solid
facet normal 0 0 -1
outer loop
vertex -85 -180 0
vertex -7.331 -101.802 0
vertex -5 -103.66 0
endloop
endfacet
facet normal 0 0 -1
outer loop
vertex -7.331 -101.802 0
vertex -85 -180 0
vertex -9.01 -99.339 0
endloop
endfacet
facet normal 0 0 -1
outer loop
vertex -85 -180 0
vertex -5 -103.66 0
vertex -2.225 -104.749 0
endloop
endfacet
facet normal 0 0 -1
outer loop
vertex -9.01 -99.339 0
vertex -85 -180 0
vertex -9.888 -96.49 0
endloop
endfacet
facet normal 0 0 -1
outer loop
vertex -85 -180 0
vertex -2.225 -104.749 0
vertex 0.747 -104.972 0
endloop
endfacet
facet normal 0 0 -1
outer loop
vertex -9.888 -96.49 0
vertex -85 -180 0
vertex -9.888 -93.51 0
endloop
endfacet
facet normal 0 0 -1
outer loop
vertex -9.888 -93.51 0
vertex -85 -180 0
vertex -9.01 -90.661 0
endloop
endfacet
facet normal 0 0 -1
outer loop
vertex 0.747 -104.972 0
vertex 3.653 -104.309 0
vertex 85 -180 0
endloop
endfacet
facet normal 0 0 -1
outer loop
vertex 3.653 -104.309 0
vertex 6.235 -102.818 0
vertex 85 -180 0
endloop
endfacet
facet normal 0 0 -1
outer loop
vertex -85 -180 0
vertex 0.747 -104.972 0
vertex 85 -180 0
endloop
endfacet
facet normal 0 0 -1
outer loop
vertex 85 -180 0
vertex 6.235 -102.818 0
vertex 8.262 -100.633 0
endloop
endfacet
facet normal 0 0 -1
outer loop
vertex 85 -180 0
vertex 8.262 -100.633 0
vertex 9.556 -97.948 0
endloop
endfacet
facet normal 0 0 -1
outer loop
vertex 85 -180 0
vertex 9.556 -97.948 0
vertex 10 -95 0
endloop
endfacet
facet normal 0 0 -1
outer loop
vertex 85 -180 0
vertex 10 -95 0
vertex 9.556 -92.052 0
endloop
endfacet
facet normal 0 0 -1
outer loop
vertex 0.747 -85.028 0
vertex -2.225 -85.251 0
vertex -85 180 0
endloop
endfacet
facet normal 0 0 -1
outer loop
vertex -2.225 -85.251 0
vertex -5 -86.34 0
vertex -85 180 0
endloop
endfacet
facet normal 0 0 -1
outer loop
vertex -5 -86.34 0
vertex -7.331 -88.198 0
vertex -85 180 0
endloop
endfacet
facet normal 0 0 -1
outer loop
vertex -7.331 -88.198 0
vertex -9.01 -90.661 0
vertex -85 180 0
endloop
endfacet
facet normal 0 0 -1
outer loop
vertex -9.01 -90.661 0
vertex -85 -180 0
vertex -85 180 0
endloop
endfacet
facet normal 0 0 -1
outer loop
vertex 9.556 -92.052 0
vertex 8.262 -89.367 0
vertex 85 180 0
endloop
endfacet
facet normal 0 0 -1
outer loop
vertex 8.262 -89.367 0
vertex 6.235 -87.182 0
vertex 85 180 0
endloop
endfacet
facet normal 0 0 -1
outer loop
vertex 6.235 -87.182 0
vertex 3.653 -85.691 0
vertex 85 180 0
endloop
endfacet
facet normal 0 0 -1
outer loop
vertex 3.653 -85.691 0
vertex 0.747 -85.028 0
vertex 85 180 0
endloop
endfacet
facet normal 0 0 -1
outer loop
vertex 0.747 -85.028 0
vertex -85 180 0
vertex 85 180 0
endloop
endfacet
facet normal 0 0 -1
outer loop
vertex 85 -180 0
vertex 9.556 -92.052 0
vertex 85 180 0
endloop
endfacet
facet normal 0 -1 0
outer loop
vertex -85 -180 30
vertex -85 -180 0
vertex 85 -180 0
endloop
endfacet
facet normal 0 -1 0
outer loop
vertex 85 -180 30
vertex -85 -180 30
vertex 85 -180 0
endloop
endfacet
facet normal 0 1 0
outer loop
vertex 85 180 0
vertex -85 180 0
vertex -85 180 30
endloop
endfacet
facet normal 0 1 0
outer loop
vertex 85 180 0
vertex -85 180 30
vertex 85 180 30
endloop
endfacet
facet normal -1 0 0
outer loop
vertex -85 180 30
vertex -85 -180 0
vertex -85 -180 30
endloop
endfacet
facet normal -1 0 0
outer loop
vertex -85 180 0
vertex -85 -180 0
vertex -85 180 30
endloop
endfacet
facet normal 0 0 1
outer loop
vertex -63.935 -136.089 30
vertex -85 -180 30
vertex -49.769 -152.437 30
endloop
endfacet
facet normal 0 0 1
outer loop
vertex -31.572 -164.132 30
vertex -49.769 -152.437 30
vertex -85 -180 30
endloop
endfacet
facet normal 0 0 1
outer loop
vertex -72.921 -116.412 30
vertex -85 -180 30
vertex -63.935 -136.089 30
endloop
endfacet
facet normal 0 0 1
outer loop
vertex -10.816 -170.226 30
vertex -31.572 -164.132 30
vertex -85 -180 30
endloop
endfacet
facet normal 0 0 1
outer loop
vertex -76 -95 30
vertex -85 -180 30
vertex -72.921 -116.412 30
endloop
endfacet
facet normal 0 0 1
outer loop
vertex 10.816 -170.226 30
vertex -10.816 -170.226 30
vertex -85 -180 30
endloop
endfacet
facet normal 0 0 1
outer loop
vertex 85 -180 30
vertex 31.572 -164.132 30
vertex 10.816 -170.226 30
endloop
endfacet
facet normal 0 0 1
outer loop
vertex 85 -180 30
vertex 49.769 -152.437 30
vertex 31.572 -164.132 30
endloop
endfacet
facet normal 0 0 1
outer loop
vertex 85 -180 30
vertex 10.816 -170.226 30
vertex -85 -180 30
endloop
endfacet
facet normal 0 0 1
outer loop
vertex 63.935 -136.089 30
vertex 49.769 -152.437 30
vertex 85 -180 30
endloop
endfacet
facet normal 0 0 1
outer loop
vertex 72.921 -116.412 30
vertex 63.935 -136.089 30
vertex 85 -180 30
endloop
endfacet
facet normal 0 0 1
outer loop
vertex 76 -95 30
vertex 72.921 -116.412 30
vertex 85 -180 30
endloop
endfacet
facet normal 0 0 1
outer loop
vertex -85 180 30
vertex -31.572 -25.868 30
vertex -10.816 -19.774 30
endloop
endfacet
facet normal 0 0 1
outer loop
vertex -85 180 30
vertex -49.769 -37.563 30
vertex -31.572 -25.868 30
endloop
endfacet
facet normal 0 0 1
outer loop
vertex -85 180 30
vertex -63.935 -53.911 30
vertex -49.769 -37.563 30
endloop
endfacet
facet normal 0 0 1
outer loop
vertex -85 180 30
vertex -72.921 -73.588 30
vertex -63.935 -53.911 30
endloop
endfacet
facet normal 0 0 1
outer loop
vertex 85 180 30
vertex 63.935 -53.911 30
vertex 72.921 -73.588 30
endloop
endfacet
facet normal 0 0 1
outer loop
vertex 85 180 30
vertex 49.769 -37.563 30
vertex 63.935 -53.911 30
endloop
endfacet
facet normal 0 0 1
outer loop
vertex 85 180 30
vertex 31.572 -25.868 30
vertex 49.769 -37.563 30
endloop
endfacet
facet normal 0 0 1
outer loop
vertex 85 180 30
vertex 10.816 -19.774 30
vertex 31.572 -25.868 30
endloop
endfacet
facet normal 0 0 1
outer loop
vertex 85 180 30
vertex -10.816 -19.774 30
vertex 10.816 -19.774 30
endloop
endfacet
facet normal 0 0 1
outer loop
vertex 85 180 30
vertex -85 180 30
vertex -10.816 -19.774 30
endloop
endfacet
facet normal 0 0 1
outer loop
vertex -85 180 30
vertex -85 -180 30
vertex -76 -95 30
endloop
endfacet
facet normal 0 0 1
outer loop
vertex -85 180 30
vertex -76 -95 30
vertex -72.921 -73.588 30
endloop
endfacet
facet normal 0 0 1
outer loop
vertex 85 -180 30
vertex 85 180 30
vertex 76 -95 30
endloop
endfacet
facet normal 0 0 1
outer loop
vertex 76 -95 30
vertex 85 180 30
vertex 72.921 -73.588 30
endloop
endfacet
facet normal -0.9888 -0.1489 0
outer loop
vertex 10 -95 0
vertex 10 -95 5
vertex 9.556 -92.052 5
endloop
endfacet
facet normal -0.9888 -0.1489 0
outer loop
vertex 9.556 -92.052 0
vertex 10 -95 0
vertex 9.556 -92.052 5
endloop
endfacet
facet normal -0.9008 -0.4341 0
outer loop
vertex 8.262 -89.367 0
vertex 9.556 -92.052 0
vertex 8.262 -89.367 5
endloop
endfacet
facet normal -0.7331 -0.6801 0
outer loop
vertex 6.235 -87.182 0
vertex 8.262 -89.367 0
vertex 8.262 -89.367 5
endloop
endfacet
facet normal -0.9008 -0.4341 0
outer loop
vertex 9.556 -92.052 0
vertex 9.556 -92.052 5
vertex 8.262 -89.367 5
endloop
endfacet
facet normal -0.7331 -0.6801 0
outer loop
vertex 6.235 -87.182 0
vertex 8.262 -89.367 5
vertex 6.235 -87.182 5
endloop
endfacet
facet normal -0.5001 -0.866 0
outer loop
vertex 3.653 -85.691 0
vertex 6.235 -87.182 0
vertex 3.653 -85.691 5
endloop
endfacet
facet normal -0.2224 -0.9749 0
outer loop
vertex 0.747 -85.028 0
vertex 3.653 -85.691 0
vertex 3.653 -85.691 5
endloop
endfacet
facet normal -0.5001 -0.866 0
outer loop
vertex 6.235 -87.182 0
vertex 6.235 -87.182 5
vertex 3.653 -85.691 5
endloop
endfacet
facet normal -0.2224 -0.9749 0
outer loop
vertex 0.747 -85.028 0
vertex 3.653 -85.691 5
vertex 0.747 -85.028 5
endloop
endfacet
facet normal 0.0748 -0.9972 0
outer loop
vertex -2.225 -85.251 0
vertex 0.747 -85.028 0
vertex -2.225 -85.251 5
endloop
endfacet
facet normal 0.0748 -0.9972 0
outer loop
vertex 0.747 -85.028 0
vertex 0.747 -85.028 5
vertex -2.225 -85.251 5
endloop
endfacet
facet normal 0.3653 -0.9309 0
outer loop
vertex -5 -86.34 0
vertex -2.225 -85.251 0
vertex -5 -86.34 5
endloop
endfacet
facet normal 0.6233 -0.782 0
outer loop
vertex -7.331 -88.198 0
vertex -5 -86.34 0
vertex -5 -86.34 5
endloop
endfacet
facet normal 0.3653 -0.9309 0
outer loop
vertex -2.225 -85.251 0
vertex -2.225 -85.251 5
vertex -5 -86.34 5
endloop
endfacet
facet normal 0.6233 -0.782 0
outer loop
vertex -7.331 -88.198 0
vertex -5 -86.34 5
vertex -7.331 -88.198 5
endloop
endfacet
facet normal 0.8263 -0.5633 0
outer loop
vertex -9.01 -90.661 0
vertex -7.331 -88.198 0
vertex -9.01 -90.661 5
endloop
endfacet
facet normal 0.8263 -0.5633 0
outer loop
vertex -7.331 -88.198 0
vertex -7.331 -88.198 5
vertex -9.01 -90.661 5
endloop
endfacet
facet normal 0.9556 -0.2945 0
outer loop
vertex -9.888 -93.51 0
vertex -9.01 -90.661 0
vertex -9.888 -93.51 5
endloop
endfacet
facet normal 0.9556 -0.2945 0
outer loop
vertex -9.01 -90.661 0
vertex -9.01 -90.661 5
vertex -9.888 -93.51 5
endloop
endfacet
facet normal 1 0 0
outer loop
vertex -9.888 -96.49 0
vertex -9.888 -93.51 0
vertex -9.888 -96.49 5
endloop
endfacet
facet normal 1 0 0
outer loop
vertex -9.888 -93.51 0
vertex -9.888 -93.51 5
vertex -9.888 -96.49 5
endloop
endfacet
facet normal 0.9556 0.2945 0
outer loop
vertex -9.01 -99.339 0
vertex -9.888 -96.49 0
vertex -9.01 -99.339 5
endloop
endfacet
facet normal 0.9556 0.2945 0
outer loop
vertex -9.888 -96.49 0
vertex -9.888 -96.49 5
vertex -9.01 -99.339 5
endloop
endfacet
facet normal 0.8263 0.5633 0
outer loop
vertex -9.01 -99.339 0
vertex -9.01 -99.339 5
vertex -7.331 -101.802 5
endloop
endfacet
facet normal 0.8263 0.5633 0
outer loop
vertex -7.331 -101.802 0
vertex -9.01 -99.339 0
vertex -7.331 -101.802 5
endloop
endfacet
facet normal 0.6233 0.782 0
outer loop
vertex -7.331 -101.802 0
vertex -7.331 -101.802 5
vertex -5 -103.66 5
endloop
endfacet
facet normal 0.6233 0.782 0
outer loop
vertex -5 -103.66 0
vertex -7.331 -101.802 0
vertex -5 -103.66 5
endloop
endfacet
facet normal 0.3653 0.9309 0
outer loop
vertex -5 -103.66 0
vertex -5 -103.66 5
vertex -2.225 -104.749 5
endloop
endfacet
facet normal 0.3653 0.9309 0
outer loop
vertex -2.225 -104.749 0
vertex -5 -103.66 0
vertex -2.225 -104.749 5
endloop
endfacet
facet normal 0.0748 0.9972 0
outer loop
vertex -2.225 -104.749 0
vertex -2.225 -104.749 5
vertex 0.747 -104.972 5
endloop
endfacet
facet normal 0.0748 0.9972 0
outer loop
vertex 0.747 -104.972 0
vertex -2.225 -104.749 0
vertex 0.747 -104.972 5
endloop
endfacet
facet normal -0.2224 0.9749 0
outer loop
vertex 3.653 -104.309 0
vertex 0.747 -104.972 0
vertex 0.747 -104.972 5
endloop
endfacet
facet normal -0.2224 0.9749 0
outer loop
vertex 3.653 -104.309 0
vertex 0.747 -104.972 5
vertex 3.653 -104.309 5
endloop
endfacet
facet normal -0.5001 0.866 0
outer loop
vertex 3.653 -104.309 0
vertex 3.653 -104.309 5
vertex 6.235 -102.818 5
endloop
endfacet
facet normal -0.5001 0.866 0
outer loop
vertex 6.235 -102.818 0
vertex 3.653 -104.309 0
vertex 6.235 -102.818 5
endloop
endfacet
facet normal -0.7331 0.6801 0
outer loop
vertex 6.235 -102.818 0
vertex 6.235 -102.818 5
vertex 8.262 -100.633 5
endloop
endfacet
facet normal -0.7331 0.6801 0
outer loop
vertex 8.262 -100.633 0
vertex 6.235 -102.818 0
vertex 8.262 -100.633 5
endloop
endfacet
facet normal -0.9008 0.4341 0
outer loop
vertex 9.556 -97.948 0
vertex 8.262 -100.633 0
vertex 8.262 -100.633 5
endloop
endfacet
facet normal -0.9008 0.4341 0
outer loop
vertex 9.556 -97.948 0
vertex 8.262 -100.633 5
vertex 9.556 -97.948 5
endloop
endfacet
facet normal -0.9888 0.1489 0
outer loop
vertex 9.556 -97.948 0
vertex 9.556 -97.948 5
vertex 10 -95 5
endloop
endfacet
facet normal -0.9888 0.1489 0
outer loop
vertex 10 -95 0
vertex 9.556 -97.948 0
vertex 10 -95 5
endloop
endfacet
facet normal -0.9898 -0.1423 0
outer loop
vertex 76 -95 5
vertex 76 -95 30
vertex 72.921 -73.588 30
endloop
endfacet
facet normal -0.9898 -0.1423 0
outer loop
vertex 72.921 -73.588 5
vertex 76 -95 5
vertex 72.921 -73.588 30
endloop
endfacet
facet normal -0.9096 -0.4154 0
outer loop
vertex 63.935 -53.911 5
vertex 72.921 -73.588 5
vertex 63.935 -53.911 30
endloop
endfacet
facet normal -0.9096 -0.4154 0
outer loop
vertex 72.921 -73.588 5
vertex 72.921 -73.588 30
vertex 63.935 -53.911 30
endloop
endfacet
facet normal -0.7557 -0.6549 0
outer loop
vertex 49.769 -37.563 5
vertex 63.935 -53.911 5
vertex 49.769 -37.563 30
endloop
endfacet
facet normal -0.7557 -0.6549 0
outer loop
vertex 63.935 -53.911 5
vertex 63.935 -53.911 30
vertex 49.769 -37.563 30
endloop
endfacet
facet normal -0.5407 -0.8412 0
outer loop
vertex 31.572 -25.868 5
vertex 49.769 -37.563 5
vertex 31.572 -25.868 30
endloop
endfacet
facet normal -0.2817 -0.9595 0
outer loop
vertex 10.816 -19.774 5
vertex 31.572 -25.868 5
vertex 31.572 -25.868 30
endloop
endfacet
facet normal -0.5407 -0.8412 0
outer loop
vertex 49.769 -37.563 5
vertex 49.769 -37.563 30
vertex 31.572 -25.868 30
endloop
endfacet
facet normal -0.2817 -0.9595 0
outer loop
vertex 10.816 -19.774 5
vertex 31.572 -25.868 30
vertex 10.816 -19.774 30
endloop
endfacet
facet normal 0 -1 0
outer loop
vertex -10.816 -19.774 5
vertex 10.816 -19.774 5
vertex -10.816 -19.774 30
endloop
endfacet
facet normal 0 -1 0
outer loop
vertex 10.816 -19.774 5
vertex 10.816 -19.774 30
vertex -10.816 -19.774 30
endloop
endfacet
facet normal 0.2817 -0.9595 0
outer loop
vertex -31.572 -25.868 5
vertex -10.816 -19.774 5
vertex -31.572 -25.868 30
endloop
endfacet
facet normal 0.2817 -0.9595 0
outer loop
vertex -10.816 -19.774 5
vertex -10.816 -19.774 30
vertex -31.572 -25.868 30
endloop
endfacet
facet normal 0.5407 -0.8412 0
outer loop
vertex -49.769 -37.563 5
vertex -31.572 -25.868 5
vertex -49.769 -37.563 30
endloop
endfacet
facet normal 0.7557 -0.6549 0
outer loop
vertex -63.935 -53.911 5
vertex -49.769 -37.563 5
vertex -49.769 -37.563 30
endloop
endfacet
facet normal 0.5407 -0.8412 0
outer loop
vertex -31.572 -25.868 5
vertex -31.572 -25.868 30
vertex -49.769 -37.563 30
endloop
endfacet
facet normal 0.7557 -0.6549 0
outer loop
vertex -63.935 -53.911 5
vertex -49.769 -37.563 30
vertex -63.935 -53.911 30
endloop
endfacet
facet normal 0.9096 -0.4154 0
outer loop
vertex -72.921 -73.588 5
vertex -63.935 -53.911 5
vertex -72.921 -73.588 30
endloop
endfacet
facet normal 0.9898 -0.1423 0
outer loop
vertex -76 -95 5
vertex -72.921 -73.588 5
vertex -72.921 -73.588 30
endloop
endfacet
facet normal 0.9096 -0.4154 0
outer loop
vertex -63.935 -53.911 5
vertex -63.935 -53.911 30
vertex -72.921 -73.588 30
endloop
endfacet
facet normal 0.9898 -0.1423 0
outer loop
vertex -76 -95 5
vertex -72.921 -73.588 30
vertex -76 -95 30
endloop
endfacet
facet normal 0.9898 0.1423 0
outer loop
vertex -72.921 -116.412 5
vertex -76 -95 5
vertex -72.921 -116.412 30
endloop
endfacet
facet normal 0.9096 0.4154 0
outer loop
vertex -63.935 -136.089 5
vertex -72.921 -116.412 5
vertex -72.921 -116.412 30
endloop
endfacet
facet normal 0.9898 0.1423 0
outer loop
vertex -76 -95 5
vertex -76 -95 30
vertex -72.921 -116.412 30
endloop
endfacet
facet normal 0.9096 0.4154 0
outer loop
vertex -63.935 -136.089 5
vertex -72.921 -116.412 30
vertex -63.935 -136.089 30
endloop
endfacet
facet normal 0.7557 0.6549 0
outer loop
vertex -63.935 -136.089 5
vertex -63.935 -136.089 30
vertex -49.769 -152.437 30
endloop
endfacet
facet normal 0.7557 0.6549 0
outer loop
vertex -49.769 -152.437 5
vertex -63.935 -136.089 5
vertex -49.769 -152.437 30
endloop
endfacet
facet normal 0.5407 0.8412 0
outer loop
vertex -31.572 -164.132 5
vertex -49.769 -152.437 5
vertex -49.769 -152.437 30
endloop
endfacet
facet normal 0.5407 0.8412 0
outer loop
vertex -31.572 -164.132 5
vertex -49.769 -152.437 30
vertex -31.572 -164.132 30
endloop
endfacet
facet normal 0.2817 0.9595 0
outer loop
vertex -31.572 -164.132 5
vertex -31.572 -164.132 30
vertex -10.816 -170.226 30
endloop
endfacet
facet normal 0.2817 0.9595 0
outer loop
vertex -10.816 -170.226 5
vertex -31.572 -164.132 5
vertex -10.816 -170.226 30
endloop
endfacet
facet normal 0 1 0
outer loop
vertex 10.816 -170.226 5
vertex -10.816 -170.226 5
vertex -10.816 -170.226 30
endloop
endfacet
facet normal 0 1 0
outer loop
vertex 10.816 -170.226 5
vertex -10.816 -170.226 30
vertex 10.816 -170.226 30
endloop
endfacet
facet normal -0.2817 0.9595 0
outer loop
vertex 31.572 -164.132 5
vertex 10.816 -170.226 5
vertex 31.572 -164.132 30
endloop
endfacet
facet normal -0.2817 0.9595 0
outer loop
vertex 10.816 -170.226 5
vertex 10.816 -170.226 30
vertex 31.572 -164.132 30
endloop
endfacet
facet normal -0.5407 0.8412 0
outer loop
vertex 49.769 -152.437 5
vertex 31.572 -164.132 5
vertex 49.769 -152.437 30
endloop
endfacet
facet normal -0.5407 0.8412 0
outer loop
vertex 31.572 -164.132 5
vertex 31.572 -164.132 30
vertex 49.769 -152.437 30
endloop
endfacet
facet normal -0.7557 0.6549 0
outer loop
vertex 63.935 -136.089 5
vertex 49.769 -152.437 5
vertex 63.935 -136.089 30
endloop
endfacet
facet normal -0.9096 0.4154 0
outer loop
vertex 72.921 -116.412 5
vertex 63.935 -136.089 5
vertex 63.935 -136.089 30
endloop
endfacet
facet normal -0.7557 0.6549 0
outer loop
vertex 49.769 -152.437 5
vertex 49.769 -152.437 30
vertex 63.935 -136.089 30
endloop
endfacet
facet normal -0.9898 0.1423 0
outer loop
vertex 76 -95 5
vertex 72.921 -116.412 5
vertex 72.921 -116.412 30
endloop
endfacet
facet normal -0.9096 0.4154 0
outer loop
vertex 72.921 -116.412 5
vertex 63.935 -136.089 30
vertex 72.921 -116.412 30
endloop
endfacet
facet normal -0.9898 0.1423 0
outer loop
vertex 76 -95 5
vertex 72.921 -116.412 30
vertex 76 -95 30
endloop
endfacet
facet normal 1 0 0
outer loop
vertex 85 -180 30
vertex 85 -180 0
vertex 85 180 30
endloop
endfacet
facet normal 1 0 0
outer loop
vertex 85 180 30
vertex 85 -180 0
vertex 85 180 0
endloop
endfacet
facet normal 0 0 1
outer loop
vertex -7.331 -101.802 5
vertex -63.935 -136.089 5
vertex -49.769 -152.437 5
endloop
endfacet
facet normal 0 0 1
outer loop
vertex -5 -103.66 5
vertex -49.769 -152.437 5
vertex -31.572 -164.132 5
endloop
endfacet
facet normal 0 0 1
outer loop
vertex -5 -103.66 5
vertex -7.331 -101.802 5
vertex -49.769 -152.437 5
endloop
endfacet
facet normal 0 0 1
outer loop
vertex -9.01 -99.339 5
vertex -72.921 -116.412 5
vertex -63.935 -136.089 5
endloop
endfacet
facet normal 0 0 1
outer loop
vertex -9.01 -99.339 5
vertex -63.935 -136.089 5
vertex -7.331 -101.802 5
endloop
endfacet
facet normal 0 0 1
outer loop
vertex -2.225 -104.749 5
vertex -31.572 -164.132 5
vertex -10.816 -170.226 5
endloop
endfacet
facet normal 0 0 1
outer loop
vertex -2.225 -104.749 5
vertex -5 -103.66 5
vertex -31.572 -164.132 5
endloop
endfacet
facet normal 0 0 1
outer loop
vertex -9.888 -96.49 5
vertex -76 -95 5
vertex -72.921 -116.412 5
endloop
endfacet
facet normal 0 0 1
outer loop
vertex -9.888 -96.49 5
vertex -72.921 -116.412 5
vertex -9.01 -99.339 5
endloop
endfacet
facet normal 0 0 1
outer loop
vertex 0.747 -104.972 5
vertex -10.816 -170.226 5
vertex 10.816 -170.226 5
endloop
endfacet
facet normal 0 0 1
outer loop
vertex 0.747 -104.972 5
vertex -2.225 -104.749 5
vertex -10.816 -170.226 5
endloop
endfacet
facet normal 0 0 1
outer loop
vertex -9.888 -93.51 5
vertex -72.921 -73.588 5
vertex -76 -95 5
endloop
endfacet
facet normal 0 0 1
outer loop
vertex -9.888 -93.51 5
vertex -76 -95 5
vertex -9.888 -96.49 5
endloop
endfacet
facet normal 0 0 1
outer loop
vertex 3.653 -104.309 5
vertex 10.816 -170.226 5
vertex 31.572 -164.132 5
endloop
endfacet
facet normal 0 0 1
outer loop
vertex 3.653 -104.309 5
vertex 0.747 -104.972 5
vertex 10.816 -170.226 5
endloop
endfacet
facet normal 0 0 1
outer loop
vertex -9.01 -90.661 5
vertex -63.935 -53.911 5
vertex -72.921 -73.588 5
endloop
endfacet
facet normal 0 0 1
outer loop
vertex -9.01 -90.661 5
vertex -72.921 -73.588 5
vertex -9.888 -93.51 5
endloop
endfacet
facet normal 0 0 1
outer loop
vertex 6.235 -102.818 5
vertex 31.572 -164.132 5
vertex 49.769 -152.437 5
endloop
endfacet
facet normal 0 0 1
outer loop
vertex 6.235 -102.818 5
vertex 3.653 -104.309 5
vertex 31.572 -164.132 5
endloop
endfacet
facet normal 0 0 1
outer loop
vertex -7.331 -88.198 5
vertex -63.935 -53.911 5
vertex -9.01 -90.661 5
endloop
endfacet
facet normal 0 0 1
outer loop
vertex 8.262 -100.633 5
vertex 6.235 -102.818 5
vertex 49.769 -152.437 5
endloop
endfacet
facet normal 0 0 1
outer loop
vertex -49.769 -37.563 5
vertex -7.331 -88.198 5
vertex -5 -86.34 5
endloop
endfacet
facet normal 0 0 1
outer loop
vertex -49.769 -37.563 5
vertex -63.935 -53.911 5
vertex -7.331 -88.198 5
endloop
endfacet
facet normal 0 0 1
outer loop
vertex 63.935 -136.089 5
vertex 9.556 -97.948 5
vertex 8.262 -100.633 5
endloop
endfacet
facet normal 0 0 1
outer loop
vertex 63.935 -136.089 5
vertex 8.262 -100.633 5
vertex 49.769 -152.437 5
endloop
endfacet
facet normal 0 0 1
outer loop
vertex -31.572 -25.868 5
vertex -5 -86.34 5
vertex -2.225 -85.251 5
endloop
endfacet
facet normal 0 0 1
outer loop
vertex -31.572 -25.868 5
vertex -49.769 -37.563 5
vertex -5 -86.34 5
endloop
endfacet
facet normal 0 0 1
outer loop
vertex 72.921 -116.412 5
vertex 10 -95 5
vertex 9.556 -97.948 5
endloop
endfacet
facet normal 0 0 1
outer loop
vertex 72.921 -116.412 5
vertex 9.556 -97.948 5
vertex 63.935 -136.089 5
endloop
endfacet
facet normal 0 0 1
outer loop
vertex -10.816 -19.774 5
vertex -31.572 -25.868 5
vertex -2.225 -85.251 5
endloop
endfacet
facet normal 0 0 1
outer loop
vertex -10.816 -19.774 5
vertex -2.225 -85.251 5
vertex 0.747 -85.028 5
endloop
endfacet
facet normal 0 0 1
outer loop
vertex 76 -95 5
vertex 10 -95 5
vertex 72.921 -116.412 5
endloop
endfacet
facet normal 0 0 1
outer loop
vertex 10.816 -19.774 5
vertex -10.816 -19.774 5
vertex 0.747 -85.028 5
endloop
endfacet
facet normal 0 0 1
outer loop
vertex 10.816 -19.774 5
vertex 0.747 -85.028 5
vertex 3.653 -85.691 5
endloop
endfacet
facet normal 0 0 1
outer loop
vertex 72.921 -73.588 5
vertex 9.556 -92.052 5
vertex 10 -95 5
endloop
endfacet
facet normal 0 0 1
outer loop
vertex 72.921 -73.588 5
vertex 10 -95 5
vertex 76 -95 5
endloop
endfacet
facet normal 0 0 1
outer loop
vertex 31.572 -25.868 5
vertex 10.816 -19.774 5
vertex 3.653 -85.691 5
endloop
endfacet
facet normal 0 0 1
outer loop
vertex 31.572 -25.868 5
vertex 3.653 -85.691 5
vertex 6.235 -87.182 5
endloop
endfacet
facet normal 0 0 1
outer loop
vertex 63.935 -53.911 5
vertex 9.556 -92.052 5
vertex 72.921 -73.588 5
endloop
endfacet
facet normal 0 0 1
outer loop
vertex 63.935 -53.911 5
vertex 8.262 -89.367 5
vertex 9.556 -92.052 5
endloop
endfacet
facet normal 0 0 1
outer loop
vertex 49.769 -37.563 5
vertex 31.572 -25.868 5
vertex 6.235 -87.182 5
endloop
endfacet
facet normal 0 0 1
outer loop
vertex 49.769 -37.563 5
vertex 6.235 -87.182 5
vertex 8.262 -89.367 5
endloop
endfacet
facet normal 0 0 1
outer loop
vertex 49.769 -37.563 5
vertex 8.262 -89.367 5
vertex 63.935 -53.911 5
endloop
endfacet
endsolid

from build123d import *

# Parameters (mm, degrees)
F0_W     = 170
F0_H     = 360
F1_DEPTH = 30
F2_R     = 10
F3_DEPTH = 30.001
F4_R     = 76
F4_R_2   = 10
F5_DEPTH = 25


with BuildPart() as f1:
    # F0 (on Top) → F1 (new body)
    with BuildSketch(Plane.XY):
        Rectangle(F0_W, F0_H)
    extrude(amount=F1_DEPTH)

    # F2 (on face) → F3 (cut, through all)
    with BuildSketch(Plane.XY.offset(30)):
        with Locations((0, -95)):
            Circle(F2_R)
    extrude(amount=-F3_DEPTH, mode=Mode.SUBTRACT)

    # F4 (on face) → F5 (cut)
    with BuildSketch(Plane.XY.offset(30)):
        with Locations((0, -95)):
            Circle(F4_R)
        with Locations((0, -95)):
            Circle(F4_R)
        with Locations((0, -95)):
            Circle(F4_R_2, mode=Mode.SUBTRACT)
    extrude(amount=-F5_DEPTH, mode=Mode.SUBTRACT)


solid = f1.part
